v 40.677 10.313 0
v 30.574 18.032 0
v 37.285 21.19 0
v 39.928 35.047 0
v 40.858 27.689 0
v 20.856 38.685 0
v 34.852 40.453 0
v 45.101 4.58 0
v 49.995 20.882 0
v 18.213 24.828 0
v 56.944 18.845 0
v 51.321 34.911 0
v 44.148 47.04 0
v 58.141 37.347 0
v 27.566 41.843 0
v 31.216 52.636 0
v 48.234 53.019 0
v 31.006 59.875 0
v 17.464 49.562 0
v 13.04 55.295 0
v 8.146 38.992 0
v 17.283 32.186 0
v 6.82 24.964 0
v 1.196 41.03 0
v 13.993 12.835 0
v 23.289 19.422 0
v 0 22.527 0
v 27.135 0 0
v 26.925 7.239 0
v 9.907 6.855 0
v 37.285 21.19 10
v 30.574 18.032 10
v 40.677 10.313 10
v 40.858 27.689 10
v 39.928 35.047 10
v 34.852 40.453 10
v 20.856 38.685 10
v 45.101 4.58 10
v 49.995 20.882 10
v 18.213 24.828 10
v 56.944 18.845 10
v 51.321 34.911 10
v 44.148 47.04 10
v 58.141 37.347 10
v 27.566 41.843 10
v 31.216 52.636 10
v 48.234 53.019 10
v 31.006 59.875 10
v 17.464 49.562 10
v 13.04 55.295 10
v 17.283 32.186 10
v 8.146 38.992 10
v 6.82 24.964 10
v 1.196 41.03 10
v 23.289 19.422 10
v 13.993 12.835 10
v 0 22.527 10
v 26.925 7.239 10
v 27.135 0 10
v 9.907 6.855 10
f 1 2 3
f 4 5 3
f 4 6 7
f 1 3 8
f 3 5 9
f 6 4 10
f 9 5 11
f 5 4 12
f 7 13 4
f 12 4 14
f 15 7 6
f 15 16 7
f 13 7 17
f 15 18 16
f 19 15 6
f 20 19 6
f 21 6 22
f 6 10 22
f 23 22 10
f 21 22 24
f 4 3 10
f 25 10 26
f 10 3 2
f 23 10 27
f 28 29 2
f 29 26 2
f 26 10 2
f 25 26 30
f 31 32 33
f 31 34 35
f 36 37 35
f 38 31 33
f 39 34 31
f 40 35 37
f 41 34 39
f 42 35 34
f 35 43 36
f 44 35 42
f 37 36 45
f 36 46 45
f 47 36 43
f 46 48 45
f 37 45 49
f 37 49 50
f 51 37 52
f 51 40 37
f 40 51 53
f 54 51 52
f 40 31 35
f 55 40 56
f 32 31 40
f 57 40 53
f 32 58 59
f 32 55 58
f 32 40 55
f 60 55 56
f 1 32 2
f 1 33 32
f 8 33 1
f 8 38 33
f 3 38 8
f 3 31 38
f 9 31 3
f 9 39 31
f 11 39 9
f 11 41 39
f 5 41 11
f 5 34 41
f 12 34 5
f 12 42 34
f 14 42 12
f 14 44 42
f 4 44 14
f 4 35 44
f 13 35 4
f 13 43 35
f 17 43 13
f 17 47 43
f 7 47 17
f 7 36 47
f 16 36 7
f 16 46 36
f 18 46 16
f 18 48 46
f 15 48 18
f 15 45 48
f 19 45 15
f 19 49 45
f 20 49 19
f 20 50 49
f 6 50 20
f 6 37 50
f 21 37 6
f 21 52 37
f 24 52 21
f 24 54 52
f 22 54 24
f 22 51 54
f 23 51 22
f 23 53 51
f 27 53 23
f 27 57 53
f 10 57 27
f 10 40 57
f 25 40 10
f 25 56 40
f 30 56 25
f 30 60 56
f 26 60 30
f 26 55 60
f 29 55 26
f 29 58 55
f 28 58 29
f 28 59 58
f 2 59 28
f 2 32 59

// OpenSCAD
$fn = 32;

// ----------------------------------------------------------------------
// Fan rotor section: 10 blades, 12 mm hub radius, 18 mm blades
// ----------------------------------------------------------------------

// --- parameters (mm) ---
profile_height = 10;      // extrusion height
profile_points = 30;      // points of the closed outline

profile = [[40.858, 27.689], [51.321, 34.911], [58.141, 37.347], [39.928, 35.047], [44.148, 47.04], [48.234, 53.019], [34.852, 40.453], [31.216, 52.636], [31.006, 59.875], [27.566, 41.843], [17.464, 49.562], [13.04, 55.295], [20.856, 38.685], [8.146, 38.992], [1.196, 41.03], [17.283, 32.186], [6.82, 24.964], [0, 22.527], [18.213, 24.828], [13.993, 12.835], [9.907, 6.855], [23.289, 19.422], [26.925, 7.239], [27.135, 0], [30.574, 18.032], [40.677, 10.313], [45.101, 4.58], [37.285, 21.19], [49.995, 20.882], [56.944, 18.845]];  // single closed polygon, 30 points, counter clockwise

// --- the one profile operation ---
linear_extrude(height = profile_height) polygon(points = profile);
